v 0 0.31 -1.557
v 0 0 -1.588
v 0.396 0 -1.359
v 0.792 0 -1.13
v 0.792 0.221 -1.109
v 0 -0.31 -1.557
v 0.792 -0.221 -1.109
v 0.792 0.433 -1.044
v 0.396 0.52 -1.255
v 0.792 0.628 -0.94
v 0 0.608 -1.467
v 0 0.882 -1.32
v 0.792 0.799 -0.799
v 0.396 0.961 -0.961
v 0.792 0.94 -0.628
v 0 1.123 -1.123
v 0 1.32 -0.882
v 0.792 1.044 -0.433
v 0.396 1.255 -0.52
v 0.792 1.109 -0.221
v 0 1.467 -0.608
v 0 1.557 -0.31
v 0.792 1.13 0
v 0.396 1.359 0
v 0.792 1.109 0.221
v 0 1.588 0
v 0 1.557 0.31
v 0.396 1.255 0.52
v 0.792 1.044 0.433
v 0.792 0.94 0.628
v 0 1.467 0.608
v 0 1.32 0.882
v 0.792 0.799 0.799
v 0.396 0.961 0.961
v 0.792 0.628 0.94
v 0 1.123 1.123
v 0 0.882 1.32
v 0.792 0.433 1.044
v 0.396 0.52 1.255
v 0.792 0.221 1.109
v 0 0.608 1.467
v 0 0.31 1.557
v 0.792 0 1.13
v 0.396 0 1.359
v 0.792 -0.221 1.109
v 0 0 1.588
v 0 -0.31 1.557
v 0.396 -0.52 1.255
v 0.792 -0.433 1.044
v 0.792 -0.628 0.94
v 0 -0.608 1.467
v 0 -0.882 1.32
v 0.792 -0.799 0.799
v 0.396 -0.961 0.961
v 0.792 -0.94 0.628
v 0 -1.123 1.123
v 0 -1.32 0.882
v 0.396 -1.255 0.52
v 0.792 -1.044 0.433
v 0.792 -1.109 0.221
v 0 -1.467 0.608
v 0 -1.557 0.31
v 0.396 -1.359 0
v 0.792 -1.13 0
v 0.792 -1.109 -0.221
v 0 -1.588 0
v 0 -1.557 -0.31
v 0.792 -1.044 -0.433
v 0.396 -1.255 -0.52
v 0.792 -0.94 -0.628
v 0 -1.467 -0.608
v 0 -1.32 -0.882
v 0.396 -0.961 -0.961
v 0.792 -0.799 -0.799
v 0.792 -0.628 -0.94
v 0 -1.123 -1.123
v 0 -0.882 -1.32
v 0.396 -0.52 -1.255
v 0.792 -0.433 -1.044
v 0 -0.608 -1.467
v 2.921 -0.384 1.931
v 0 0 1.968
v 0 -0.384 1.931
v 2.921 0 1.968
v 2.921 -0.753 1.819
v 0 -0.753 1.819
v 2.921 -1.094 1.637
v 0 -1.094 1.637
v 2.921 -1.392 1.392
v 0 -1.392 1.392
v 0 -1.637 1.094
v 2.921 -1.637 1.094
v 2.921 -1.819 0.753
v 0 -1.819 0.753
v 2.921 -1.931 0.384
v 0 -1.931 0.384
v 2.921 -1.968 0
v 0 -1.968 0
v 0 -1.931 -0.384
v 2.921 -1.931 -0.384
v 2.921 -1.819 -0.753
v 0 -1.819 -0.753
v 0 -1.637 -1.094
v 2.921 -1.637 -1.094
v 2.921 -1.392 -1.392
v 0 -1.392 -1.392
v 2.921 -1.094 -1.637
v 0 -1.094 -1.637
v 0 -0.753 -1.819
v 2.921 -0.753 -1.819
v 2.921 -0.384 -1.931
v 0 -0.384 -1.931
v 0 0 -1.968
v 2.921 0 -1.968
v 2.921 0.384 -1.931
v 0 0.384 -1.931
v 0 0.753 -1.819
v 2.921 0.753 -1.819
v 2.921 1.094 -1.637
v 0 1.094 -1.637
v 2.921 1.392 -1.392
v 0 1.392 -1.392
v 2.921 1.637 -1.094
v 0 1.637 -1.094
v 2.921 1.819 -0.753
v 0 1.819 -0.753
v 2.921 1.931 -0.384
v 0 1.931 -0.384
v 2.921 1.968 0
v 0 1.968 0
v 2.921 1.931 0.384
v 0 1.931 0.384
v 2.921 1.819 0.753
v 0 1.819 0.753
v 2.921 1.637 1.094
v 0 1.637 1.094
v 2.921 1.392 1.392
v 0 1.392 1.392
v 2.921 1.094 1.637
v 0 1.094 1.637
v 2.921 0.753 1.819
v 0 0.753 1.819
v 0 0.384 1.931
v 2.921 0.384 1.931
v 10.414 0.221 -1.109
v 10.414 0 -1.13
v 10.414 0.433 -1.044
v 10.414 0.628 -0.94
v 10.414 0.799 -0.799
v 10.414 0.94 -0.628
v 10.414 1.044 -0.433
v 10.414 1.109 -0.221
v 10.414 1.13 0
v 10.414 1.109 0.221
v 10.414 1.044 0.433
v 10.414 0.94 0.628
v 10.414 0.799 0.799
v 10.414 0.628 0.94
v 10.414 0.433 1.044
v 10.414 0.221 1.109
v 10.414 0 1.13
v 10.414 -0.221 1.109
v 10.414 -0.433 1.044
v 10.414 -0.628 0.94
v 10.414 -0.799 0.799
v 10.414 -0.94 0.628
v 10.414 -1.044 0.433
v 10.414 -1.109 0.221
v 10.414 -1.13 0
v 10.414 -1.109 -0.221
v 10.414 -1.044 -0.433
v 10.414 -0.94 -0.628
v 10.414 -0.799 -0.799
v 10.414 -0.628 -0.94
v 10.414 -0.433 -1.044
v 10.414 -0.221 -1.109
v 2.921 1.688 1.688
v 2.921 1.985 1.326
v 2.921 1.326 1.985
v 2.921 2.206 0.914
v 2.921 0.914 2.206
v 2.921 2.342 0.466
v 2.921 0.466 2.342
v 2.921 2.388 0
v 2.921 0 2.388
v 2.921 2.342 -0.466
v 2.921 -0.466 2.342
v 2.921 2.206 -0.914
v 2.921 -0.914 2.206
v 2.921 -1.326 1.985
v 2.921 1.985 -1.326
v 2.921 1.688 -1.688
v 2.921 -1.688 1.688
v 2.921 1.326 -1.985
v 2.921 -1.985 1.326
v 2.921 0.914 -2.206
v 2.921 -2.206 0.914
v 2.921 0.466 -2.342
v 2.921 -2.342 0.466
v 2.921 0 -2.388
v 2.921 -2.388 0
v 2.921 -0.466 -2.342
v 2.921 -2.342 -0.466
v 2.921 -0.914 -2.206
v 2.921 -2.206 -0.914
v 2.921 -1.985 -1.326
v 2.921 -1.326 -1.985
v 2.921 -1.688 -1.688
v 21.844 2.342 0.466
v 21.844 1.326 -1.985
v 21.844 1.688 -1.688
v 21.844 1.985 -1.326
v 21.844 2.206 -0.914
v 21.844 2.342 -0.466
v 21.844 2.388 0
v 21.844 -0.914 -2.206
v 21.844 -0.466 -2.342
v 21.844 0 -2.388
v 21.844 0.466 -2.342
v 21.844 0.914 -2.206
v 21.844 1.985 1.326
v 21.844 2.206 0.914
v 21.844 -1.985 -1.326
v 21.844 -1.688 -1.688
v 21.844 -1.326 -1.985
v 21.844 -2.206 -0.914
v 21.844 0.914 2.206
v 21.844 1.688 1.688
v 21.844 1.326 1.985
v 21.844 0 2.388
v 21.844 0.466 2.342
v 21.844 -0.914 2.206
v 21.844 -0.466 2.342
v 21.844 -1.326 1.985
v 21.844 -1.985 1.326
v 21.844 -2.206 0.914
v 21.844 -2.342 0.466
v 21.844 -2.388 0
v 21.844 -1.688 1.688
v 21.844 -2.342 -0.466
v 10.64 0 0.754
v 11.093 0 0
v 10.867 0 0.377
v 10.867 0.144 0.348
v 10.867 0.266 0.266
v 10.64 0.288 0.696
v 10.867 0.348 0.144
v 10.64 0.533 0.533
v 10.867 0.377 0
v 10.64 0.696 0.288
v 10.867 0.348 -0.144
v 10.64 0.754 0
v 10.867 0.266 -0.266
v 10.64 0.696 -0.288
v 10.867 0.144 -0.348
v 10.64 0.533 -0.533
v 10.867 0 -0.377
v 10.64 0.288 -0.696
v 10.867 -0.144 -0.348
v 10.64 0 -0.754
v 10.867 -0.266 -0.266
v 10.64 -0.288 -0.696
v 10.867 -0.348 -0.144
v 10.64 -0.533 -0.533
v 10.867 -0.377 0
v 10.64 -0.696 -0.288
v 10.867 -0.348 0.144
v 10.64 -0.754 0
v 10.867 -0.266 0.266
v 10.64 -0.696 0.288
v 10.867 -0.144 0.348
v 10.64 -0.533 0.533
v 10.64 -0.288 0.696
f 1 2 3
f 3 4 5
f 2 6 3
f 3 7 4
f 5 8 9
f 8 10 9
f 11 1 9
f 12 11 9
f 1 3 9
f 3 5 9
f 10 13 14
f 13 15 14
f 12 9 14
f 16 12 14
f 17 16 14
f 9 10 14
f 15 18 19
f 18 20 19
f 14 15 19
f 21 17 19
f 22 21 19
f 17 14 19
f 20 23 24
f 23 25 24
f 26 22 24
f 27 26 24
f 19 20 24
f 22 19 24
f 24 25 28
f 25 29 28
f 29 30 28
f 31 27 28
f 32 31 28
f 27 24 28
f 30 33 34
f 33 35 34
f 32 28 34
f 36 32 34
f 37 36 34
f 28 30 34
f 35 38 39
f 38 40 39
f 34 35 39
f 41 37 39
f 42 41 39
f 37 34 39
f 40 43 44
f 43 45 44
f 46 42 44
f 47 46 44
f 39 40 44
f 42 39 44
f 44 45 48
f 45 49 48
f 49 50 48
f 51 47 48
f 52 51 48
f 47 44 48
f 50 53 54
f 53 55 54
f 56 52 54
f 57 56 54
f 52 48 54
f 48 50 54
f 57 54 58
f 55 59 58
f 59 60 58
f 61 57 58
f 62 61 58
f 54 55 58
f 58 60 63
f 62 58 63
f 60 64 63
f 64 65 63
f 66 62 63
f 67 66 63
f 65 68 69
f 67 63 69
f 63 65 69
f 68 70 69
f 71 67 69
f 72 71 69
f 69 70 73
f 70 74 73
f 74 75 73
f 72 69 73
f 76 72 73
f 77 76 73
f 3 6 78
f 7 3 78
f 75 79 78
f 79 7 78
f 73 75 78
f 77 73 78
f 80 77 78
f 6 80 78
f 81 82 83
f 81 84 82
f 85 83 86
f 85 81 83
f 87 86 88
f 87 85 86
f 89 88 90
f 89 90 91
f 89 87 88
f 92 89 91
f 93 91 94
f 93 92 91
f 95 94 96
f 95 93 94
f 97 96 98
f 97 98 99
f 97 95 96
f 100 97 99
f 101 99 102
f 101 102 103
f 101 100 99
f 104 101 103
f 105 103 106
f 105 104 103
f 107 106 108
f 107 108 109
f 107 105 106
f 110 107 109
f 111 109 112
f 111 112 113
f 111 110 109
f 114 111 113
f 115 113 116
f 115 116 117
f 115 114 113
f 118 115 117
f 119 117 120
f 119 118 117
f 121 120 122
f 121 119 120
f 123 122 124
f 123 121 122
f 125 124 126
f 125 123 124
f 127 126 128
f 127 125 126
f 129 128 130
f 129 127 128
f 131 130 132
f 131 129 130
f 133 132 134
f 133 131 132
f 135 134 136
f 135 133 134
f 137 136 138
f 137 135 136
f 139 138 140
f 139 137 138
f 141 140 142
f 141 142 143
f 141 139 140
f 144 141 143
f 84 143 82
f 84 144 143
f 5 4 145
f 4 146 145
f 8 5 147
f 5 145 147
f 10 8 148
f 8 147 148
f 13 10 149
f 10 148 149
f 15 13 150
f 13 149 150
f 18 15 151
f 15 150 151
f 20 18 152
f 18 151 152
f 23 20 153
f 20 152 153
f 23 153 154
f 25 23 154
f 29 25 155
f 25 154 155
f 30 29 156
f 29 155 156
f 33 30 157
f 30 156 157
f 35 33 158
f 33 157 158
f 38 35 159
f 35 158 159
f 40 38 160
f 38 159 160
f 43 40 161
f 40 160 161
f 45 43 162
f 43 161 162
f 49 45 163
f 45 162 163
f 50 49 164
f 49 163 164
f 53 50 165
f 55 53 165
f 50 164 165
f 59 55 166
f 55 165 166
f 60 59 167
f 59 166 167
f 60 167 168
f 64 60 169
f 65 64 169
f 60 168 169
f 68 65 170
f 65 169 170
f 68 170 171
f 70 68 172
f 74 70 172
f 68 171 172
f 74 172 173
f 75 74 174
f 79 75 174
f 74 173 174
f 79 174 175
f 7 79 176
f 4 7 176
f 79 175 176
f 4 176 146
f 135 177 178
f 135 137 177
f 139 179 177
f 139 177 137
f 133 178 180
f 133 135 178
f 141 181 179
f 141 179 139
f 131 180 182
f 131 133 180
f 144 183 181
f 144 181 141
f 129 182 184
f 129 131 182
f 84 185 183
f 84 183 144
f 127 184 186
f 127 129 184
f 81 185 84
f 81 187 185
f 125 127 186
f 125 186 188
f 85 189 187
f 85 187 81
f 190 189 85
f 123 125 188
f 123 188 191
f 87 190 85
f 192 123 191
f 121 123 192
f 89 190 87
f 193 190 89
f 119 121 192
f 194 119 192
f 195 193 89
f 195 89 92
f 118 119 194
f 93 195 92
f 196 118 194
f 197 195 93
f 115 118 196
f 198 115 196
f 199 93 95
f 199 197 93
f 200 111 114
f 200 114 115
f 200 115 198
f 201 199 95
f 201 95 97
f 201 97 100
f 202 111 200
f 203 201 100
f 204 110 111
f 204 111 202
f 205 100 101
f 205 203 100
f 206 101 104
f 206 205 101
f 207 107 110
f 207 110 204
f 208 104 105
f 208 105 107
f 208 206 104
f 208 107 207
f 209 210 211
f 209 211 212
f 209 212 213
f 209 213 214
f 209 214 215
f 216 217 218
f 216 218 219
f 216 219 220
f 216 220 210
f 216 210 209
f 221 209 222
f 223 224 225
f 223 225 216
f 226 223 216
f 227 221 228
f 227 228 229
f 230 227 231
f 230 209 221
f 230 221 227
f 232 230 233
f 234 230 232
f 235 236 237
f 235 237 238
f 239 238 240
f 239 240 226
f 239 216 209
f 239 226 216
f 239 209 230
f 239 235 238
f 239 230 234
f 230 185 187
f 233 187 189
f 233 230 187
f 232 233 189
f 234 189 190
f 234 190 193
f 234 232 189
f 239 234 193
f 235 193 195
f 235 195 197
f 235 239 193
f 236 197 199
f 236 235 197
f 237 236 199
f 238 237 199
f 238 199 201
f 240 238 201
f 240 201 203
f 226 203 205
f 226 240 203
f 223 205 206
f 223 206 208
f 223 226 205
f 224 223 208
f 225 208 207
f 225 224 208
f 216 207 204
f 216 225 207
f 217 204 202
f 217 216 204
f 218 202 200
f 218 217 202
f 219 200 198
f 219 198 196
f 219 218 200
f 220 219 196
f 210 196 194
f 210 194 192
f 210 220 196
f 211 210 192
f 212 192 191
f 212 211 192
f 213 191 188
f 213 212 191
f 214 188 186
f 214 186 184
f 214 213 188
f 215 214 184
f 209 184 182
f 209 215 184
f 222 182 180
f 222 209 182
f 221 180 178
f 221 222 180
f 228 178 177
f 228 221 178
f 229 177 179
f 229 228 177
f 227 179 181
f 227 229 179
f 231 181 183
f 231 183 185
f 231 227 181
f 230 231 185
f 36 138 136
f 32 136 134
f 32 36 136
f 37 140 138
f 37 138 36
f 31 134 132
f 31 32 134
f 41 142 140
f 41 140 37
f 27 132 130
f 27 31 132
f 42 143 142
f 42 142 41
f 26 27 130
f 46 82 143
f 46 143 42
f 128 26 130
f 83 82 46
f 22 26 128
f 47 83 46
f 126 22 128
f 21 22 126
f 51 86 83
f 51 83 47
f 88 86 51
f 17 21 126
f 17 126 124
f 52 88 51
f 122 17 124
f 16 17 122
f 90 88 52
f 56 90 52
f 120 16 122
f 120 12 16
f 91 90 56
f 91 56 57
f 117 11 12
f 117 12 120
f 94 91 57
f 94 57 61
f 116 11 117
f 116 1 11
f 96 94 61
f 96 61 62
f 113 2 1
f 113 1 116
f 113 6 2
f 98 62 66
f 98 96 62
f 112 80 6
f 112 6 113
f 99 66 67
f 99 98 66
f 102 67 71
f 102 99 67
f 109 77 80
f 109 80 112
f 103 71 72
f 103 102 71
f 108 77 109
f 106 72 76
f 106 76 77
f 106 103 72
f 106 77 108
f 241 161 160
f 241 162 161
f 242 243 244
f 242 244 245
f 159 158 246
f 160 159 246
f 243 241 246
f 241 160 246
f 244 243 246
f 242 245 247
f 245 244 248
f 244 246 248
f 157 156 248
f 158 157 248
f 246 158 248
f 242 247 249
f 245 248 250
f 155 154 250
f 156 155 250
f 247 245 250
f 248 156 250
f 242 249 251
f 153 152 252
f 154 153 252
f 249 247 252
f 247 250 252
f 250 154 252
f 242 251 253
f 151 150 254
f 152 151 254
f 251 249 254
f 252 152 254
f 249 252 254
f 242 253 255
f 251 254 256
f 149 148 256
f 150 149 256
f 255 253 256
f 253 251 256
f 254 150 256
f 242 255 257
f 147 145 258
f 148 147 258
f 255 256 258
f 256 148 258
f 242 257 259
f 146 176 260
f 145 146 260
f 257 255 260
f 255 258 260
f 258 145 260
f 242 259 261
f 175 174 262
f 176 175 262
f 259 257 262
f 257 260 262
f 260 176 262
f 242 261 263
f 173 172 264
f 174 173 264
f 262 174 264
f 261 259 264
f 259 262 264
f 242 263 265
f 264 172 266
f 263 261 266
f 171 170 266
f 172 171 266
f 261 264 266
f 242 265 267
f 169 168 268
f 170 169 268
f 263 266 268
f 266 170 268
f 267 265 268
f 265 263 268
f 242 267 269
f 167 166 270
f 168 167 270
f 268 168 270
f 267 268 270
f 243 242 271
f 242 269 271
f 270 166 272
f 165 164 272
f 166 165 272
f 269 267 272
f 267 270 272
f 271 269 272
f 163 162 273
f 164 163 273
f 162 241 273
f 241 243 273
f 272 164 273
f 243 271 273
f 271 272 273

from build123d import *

# Parameters (mm, degrees)
F_4_40_TAPPED_HOLE1_D           = 2.2606
F_4_40_TAPPED_HOLE1_DEPTH       = 10.414
F_4_40_TAPPED_HOLE1_CSINK_D     = 3.175
F_4_40_TAPPED_HOLE1_CSINK_ANGLE = 60
F_4_40_TAPPED_HOLE1_TIP         = 0.679152758


with BuildPart() as part:
    # Sketch3 → Revolve1 (revolve)
    with BuildSketch(Plane.XY, mode=Mode.PRIVATE) as revolve1_sk:
        Polygon((0, 0), (0, -1.9685), (2.921, -1.9685), (2.921, -2.3876), (21.844, -2.3876), (21.844, 0), align=None)
    revolve(revolve1_sk.sketch.rotate(Axis((0, 0, 0), (1, 0, 0)), 270), axis=Axis((0, 0, 0), (1, 0, 0)))

    # #4-40 Tapped Hole1
    with Locations(Plane.ZY):
        with Locations((0, 0)):
            CounterSinkHole(F_4_40_TAPPED_HOLE1_D / 2, F_4_40_TAPPED_HOLE1_CSINK_D / 2, depth=F_4_40_TAPPED_HOLE1_DEPTH, counter_sink_angle=F_4_40_TAPPED_HOLE1_CSINK_ANGLE)
            with Locations((0, 0, -(F_4_40_TAPPED_HOLE1_DEPTH + F_4_40_TAPPED_HOLE1_TIP / 2))):  # 118° drill point
                Cone(0, F_4_40_TAPPED_HOLE1_D / 2, F_4_40_TAPPED_HOLE1_TIP, mode=Mode.SUBTRACT)


solid = part.part
